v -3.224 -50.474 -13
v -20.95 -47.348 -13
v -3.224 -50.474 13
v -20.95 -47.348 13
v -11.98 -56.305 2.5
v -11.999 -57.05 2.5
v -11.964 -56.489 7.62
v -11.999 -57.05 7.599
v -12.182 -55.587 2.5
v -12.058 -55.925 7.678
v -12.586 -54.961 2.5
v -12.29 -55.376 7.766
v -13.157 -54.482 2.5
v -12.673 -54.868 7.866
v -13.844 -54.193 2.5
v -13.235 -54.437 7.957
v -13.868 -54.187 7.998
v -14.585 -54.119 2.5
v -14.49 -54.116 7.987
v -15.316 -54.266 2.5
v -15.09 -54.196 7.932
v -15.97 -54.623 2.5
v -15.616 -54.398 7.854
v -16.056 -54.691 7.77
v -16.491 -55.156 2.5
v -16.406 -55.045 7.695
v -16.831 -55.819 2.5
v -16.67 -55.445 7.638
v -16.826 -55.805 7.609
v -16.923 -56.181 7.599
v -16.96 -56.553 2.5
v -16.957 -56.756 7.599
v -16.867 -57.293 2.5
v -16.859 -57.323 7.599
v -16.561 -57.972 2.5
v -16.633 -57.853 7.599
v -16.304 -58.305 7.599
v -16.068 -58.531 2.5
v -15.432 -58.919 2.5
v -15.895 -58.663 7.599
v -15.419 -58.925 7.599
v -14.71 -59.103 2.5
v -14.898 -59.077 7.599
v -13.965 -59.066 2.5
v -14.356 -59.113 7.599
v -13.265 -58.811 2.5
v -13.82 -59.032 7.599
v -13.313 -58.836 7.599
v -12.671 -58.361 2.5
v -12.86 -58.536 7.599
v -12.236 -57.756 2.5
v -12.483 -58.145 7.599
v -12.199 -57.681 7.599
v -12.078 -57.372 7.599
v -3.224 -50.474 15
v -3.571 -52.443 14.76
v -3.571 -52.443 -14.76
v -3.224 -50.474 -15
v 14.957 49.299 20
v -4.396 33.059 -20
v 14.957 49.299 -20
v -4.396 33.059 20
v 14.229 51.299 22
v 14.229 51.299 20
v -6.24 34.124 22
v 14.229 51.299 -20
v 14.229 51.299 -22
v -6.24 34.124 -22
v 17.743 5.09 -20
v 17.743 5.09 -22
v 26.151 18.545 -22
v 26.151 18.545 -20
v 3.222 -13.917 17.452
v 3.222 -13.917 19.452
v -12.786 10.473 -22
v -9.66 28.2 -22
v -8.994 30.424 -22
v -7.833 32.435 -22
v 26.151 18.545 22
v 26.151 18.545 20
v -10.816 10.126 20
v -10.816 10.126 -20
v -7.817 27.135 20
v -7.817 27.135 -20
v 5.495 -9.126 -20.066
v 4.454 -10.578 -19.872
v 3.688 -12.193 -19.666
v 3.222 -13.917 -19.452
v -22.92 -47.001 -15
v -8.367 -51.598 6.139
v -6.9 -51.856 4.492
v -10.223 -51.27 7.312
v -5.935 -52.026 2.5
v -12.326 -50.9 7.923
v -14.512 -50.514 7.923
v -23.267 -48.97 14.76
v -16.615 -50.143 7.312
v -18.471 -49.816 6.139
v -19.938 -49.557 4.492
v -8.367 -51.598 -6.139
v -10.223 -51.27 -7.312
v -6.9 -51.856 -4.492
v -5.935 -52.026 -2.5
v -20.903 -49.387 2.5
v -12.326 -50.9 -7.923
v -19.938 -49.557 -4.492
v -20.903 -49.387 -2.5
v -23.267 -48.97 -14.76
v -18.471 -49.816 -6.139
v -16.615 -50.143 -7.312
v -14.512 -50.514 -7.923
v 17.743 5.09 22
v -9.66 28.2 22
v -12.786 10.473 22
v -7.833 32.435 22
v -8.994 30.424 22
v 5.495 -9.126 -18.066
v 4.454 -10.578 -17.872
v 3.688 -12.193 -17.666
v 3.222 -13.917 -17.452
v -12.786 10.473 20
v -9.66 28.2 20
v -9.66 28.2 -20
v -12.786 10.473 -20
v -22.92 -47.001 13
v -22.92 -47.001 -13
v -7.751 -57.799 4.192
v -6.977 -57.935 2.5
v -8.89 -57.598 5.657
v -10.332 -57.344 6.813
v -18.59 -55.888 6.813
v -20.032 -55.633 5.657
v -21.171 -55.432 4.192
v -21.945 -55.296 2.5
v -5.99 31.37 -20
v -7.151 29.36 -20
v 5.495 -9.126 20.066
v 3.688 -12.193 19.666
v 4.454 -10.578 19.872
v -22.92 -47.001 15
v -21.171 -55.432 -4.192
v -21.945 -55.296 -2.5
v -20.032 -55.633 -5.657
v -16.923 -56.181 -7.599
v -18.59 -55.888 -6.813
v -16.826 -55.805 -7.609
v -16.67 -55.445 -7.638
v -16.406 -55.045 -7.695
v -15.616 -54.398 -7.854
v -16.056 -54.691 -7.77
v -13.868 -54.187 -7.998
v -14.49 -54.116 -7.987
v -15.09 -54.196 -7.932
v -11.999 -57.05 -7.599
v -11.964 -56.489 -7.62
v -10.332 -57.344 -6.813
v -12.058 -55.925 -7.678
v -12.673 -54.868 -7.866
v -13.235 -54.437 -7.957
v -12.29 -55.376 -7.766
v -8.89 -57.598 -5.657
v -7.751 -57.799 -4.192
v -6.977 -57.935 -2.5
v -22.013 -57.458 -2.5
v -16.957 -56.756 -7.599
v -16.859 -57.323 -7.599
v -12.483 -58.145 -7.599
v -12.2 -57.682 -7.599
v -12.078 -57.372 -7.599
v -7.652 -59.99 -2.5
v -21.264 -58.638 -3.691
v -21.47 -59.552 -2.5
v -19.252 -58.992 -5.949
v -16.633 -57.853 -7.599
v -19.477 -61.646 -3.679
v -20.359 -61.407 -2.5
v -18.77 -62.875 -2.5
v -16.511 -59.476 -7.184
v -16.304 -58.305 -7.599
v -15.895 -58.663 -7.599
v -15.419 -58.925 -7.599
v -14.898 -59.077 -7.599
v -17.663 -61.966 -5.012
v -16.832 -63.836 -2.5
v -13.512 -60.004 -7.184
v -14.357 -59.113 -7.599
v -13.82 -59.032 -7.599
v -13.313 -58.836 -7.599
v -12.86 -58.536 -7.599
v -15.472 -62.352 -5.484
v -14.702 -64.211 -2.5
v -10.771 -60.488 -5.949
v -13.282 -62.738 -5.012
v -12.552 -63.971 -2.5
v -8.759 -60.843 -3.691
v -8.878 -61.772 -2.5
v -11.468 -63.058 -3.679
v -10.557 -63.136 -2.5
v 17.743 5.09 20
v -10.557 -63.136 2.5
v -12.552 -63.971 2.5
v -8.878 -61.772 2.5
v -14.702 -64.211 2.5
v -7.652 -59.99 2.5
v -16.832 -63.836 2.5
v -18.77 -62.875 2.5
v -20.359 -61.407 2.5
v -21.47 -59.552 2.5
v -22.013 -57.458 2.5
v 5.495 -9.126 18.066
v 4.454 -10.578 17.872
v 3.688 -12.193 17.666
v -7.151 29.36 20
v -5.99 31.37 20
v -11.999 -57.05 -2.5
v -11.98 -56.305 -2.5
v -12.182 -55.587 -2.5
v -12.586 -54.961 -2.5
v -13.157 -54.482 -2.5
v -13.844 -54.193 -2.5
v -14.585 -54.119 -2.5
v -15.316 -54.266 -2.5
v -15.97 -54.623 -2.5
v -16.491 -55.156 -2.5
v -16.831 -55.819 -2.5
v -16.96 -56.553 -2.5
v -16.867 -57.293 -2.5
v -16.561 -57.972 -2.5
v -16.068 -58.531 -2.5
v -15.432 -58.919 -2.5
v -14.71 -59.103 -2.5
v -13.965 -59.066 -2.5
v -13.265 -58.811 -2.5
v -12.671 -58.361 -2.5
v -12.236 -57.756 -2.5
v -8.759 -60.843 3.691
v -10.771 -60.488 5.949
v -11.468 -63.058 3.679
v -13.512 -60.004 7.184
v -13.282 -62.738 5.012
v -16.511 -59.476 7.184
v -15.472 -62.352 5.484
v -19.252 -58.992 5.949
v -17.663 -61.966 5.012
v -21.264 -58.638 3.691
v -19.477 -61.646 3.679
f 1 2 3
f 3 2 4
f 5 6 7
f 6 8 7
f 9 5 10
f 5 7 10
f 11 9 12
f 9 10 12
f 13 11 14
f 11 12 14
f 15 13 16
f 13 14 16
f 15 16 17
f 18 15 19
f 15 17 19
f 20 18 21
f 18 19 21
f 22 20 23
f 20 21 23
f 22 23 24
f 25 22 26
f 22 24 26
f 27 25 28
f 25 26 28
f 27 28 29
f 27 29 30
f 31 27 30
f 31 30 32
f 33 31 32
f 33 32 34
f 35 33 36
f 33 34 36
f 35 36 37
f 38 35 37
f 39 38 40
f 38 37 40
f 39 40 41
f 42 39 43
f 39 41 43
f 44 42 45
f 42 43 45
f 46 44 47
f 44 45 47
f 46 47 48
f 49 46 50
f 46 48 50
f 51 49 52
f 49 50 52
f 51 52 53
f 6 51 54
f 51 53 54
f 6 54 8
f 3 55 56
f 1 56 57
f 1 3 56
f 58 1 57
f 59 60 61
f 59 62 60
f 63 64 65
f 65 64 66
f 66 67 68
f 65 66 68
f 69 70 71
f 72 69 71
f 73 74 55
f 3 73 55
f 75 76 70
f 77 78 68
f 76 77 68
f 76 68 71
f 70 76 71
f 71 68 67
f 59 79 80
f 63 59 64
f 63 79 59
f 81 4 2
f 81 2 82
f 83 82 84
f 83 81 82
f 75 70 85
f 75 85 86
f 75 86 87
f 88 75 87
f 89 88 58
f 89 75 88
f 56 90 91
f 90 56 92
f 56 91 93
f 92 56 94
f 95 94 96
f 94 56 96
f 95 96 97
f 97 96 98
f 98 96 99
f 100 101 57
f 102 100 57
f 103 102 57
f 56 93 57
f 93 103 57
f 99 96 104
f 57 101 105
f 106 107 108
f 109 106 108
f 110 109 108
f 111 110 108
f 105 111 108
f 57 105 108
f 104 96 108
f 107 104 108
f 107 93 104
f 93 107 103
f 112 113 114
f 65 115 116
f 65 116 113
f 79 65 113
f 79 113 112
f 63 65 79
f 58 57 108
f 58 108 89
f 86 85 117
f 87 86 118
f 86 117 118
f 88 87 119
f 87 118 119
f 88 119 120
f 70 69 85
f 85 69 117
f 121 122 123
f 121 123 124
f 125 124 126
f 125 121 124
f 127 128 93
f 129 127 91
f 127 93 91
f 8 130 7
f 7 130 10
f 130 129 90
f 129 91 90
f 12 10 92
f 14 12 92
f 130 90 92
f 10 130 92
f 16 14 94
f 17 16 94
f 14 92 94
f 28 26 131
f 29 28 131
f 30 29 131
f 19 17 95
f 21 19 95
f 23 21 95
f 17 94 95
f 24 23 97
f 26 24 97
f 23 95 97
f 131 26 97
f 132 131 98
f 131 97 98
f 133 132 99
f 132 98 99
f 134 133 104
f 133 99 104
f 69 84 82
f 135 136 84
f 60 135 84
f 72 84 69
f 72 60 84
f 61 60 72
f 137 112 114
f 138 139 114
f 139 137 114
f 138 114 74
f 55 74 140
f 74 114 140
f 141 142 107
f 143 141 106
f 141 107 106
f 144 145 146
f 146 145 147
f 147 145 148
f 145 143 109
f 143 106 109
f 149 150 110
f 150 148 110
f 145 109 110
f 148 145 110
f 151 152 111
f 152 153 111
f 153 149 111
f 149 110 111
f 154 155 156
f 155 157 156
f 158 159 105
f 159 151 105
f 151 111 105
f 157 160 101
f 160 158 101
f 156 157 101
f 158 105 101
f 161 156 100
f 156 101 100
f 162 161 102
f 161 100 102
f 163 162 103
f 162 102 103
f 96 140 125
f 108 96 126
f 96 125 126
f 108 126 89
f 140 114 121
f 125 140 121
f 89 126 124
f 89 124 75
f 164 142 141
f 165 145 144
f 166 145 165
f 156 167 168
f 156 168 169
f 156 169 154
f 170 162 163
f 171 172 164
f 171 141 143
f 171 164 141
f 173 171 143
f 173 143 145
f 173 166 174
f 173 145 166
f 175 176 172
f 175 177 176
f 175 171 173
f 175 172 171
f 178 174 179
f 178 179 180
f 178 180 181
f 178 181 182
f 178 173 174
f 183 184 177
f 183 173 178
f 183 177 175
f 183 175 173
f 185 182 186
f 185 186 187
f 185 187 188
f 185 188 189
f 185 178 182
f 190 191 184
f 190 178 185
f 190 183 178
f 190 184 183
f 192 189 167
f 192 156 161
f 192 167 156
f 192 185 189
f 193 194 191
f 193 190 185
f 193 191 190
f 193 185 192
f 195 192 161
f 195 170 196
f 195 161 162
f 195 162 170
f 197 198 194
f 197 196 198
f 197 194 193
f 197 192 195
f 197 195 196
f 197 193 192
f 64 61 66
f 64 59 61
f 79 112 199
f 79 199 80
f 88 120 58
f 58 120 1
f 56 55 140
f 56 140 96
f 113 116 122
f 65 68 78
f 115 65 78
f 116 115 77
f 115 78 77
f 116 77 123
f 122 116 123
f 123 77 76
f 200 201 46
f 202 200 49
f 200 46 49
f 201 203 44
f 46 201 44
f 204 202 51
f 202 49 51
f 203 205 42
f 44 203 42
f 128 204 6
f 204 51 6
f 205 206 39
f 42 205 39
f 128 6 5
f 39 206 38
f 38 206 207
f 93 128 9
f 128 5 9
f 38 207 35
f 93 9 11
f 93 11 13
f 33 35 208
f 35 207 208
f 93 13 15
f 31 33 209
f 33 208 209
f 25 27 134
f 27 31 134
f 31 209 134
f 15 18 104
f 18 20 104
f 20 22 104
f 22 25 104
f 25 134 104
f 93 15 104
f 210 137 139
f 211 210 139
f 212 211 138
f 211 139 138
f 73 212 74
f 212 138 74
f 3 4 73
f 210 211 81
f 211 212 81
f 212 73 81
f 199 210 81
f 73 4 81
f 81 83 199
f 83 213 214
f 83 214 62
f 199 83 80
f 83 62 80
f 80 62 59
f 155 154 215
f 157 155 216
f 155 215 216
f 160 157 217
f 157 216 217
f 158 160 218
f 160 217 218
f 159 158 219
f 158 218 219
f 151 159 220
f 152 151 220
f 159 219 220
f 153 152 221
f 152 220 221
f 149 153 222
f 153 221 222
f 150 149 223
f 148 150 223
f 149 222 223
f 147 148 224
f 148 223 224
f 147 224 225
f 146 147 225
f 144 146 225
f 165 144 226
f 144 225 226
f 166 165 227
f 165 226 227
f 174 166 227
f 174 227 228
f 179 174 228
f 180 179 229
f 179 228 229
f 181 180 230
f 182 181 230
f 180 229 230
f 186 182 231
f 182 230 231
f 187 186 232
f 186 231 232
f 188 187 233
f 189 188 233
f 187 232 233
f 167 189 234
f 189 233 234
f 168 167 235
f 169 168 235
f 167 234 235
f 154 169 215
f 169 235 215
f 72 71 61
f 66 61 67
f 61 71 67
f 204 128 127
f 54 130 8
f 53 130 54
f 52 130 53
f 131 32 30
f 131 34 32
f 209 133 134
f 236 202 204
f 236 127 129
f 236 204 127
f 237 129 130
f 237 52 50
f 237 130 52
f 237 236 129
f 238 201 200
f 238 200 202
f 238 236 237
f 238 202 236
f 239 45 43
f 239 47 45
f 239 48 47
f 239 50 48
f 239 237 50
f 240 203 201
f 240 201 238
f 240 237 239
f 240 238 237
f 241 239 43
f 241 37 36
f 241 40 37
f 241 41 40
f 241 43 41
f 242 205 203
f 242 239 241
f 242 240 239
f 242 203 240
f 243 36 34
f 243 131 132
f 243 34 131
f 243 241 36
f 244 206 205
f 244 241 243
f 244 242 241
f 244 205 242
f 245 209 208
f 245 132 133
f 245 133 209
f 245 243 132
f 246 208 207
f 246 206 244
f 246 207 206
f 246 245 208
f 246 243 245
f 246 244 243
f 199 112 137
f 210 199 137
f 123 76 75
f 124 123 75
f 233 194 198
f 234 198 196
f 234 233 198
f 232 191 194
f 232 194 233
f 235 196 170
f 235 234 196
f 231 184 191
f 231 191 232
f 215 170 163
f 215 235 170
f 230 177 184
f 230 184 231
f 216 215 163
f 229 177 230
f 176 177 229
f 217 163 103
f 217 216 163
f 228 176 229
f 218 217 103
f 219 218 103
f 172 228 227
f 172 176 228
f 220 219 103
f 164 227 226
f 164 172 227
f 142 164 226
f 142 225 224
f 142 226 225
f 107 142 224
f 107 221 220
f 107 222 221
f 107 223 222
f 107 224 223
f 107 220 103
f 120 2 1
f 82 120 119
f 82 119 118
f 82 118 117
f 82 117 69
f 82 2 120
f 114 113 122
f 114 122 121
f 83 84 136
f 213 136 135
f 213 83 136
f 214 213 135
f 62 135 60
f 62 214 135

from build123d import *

# Parameters (mm, degrees)
EXTRUDE_1_DEPTH     = 20
CUT_EXTRUDE_1_DEPTH = 2
EXTRUDE_START       = 2
EXTRUDE_2_DEPTH     = 2
EXTRUDE_3_DEPTH     = 33
CUT_EXTRUDE_4_DEPTH = 22.5
EXTRUDE_5_DEPTH     = 20
SKETCH_11_R         = 8
EXTRUDE_6_DEPTH     = 6
SKETCH_13_W         = 5
SKETCH_13_H         = 22.035528512
CUT_EXTRUDE_5_DEPTH = 40
SKETCH_14_R         = 2.5
CUT_EXTRUDE_6_DEPTH = 20


with BuildPart() as part:
    # 草图1 → 凸台-拉伸1 (new, symmetric)
    with BuildSketch(Plane.XY):
        with BuildLine():
            Line((14.229470778, 51.299168583), (-6.23969278, 34.123500992))
            ThreePointArc((-6.23969278, 34.123500992), (-8.472070721, 31.463056561), (-9.659894213, 28.199538337))
            Line((-9.659894213, 28.199538337), (-22.919720748, -47.000674818))
            Line((-22.919720748, -47.000674818), (-20.950105242, -47.347971173))
            Line((-20.950105242, -47.347971173), (-7.816684243, 27.135360565))
            ThreePointArc((-7.816684243, 27.135360565), (-6.628860751, 30.398878788), (-4.39648281, 33.059323219))
            Line((-4.39648281, 33.059323219), (14.957411246, 49.299168583))
            Line((14.957411246, 49.299168583), (14.229470778, 51.299168583))
        make_face()
    extrude(amount=EXTRUDE_1_DEPTH, both=True)

    # 草图3 → 切除-拉伸1 (cut)
    with BuildSketch(Plane(origin=(-14.191017833, 2.502259328, 0), x_dir=(0, 0, 1), z_dir=(-0.9848077530122074, 0.17364817766693458, 0))):
        Polygon((13, -50.266596698), (20, -50.266596698), (20, 8.093700959), align=None)
    cut_extrude_1 = extrude(amount=-CUT_EXTRUDE_1_DEPTH, mode=Mode.SUBTRACT)

    # 镜向1: 切除-拉伸1 across plane
    add(cut_extrude_1.mirror(Plane.XY), mode=Mode.SUBTRACT)

    # 草图4 → 凸台-拉伸2 (add)
    with BuildSketch(Plane.XY.offset(20).offset(EXTRUDE_START)):
        with BuildLine():
            Line((-12.785561411, 10.472998783), (17.743478932, 5.089905275))
            Line((17.743478932, 5.089905275), (26.15106548, 18.544856334))
            Line((26.15106548, 18.544856334), (14.229470778, 51.299168583))
            Line((14.229470778, 51.299168583), (-6.23969278, 34.123500992))
            ThreePointArc((-6.23969278, 34.123500992), (-8.472070721, 31.463056561), (-9.659894213, 28.199538337))
            Line((-9.659894213, 28.199538337), (-12.785561411, 10.472998783))
        make_face()
    extrude_2 = extrude(amount=-EXTRUDE_2_DEPTH)

    # 草图5 → 凸台-拉伸3 (add)
    with BuildSketch(Plane(origin=(-14.191017833, 2.502259328, 0), x_dir=(0, 0, 1), z_dir=(-0.9848077530122074, 0.17364817766693458, 0))):
        Polygon((22, 8.093700959), (15, -50.266596698), (13, -50.266596698), (20, 8.093700959), align=None)
    extrude_3 = extrude(amount=-EXTRUDE_3_DEPTH)

    # 镜向3: 凸台-拉伸2, 凸台-拉伸3 across plane
    add(extrude_2.mirror(Plane.XY))
    add(extrude_3.mirror(Plane.XY))

    # 草图8 → 切除-拉伸4 (cut, symmetric)
    with BuildSketch(Plane.XY):
        with BuildLine():
            Line((17.743478932, 5.089905275), (5.494596432, -9.126276461))
            ThreePointArc((5.494596432, -9.126276461), (4.035122352, -11.368395051), (3.222317206, -13.917219909))
            Line((3.222317206, -13.917219909), (-3.223565687, -50.473638371))
            Line((-3.223565687, -50.473638371), (21.878971758, -54.899893007))
            Line((21.878971758, -54.899893007), (32.013131095, 2.573780594))
            Line((32.013131095, 2.573780594), (17.743478932, 5.089905275))
        make_face()
    extrude(amount=CUT_EXTRUDE_4_DEPTH, both=True, mode=Mode.SUBTRACT)

    # 草图10 → 凸台-拉伸5 (add)
    with BuildSketch(Plane(origin=(-14.191017833, 2.502259328, 0), x_dir=(0, 0, 1), z_dir=(-0.9848077530122074, 0.17364817766693458, 0))):
        Polygon((-15, -50.266596698), (15, -50.266596698), (14.760110888, -52.266596698), (-14.760110888, -52.266596698), align=None)
    extrude(amount=-EXTRUDE_5_DEPTH)

    # 草图11 → 凸台-拉伸6 (add)
    with BuildSketch(Plane(origin=(-9.075999269, -51.472549652, 0), x_dir=(0.9848077530122074, -0.17364817766693455, 0), z_dir=(-0.17364817766693455, -0.9848077530122074, 0))):
        with Locations(Location((-4.409937158, 0, 0), (0, 0, 180))):
            Circle(SKETCH_11_R)
    extrude(amount=EXTRUDE_6_DEPTH)

    # 草图12 → 旋转1 (revolve)
    with BuildSketch(Plane.XY, mode=Mode.PRIVATE) as revolve_1_sk:
        with BuildLine():
            Line((-14.460828639, -56.615618619), (-6.582366615, -58.00480404))
            ThreePointArc((-6.582366615, -58.00480404), (-9.872217148, -63.168834973), (-15.85001406, -64.494080643))
            Line((-15.85001406, -64.494080643), (-14.460828639, -56.615618619))
        make_face()
    revolve(revolve_1_sk.sketch.rotate(Axis((-14.460828639, -56.615618619, 0), (-0.17364817766693416, -0.9848077530122075, 0)), 180), axis=Axis((-14.460828639, -56.615618619, 0), (-0.17364817766693416, -0.9848077530122075, 0)))

    # 草图13 → 切除-拉伸5 (cut)
    with BuildSketch(Plane(origin=(-14.191017833, 2.502259328, 0), x_dir=(0, 0, 1), z_dir=(-0.9848077530122074, 0.17364817766693458, 0))):
        with Locations((0, -63.284360954)):
            Rectangle(SKETCH_13_W, SKETCH_13_H)
    extrude(amount=-CUT_EXTRUDE_5_DEPTH, mode=Mode.SUBTRACT)

    # 草图14 → 切除-拉伸6 (cut, symmetric)
    with BuildSketch(Plane.XY):
        with Locations(Location((-14.460828639, -56.615618619, 0), (0, 0, 350))):
            Circle(SKETCH_14_R)
    extrude(amount=CUT_EXTRUDE_6_DEPTH, both=True, mode=Mode.SUBTRACT)


solid = part.part
